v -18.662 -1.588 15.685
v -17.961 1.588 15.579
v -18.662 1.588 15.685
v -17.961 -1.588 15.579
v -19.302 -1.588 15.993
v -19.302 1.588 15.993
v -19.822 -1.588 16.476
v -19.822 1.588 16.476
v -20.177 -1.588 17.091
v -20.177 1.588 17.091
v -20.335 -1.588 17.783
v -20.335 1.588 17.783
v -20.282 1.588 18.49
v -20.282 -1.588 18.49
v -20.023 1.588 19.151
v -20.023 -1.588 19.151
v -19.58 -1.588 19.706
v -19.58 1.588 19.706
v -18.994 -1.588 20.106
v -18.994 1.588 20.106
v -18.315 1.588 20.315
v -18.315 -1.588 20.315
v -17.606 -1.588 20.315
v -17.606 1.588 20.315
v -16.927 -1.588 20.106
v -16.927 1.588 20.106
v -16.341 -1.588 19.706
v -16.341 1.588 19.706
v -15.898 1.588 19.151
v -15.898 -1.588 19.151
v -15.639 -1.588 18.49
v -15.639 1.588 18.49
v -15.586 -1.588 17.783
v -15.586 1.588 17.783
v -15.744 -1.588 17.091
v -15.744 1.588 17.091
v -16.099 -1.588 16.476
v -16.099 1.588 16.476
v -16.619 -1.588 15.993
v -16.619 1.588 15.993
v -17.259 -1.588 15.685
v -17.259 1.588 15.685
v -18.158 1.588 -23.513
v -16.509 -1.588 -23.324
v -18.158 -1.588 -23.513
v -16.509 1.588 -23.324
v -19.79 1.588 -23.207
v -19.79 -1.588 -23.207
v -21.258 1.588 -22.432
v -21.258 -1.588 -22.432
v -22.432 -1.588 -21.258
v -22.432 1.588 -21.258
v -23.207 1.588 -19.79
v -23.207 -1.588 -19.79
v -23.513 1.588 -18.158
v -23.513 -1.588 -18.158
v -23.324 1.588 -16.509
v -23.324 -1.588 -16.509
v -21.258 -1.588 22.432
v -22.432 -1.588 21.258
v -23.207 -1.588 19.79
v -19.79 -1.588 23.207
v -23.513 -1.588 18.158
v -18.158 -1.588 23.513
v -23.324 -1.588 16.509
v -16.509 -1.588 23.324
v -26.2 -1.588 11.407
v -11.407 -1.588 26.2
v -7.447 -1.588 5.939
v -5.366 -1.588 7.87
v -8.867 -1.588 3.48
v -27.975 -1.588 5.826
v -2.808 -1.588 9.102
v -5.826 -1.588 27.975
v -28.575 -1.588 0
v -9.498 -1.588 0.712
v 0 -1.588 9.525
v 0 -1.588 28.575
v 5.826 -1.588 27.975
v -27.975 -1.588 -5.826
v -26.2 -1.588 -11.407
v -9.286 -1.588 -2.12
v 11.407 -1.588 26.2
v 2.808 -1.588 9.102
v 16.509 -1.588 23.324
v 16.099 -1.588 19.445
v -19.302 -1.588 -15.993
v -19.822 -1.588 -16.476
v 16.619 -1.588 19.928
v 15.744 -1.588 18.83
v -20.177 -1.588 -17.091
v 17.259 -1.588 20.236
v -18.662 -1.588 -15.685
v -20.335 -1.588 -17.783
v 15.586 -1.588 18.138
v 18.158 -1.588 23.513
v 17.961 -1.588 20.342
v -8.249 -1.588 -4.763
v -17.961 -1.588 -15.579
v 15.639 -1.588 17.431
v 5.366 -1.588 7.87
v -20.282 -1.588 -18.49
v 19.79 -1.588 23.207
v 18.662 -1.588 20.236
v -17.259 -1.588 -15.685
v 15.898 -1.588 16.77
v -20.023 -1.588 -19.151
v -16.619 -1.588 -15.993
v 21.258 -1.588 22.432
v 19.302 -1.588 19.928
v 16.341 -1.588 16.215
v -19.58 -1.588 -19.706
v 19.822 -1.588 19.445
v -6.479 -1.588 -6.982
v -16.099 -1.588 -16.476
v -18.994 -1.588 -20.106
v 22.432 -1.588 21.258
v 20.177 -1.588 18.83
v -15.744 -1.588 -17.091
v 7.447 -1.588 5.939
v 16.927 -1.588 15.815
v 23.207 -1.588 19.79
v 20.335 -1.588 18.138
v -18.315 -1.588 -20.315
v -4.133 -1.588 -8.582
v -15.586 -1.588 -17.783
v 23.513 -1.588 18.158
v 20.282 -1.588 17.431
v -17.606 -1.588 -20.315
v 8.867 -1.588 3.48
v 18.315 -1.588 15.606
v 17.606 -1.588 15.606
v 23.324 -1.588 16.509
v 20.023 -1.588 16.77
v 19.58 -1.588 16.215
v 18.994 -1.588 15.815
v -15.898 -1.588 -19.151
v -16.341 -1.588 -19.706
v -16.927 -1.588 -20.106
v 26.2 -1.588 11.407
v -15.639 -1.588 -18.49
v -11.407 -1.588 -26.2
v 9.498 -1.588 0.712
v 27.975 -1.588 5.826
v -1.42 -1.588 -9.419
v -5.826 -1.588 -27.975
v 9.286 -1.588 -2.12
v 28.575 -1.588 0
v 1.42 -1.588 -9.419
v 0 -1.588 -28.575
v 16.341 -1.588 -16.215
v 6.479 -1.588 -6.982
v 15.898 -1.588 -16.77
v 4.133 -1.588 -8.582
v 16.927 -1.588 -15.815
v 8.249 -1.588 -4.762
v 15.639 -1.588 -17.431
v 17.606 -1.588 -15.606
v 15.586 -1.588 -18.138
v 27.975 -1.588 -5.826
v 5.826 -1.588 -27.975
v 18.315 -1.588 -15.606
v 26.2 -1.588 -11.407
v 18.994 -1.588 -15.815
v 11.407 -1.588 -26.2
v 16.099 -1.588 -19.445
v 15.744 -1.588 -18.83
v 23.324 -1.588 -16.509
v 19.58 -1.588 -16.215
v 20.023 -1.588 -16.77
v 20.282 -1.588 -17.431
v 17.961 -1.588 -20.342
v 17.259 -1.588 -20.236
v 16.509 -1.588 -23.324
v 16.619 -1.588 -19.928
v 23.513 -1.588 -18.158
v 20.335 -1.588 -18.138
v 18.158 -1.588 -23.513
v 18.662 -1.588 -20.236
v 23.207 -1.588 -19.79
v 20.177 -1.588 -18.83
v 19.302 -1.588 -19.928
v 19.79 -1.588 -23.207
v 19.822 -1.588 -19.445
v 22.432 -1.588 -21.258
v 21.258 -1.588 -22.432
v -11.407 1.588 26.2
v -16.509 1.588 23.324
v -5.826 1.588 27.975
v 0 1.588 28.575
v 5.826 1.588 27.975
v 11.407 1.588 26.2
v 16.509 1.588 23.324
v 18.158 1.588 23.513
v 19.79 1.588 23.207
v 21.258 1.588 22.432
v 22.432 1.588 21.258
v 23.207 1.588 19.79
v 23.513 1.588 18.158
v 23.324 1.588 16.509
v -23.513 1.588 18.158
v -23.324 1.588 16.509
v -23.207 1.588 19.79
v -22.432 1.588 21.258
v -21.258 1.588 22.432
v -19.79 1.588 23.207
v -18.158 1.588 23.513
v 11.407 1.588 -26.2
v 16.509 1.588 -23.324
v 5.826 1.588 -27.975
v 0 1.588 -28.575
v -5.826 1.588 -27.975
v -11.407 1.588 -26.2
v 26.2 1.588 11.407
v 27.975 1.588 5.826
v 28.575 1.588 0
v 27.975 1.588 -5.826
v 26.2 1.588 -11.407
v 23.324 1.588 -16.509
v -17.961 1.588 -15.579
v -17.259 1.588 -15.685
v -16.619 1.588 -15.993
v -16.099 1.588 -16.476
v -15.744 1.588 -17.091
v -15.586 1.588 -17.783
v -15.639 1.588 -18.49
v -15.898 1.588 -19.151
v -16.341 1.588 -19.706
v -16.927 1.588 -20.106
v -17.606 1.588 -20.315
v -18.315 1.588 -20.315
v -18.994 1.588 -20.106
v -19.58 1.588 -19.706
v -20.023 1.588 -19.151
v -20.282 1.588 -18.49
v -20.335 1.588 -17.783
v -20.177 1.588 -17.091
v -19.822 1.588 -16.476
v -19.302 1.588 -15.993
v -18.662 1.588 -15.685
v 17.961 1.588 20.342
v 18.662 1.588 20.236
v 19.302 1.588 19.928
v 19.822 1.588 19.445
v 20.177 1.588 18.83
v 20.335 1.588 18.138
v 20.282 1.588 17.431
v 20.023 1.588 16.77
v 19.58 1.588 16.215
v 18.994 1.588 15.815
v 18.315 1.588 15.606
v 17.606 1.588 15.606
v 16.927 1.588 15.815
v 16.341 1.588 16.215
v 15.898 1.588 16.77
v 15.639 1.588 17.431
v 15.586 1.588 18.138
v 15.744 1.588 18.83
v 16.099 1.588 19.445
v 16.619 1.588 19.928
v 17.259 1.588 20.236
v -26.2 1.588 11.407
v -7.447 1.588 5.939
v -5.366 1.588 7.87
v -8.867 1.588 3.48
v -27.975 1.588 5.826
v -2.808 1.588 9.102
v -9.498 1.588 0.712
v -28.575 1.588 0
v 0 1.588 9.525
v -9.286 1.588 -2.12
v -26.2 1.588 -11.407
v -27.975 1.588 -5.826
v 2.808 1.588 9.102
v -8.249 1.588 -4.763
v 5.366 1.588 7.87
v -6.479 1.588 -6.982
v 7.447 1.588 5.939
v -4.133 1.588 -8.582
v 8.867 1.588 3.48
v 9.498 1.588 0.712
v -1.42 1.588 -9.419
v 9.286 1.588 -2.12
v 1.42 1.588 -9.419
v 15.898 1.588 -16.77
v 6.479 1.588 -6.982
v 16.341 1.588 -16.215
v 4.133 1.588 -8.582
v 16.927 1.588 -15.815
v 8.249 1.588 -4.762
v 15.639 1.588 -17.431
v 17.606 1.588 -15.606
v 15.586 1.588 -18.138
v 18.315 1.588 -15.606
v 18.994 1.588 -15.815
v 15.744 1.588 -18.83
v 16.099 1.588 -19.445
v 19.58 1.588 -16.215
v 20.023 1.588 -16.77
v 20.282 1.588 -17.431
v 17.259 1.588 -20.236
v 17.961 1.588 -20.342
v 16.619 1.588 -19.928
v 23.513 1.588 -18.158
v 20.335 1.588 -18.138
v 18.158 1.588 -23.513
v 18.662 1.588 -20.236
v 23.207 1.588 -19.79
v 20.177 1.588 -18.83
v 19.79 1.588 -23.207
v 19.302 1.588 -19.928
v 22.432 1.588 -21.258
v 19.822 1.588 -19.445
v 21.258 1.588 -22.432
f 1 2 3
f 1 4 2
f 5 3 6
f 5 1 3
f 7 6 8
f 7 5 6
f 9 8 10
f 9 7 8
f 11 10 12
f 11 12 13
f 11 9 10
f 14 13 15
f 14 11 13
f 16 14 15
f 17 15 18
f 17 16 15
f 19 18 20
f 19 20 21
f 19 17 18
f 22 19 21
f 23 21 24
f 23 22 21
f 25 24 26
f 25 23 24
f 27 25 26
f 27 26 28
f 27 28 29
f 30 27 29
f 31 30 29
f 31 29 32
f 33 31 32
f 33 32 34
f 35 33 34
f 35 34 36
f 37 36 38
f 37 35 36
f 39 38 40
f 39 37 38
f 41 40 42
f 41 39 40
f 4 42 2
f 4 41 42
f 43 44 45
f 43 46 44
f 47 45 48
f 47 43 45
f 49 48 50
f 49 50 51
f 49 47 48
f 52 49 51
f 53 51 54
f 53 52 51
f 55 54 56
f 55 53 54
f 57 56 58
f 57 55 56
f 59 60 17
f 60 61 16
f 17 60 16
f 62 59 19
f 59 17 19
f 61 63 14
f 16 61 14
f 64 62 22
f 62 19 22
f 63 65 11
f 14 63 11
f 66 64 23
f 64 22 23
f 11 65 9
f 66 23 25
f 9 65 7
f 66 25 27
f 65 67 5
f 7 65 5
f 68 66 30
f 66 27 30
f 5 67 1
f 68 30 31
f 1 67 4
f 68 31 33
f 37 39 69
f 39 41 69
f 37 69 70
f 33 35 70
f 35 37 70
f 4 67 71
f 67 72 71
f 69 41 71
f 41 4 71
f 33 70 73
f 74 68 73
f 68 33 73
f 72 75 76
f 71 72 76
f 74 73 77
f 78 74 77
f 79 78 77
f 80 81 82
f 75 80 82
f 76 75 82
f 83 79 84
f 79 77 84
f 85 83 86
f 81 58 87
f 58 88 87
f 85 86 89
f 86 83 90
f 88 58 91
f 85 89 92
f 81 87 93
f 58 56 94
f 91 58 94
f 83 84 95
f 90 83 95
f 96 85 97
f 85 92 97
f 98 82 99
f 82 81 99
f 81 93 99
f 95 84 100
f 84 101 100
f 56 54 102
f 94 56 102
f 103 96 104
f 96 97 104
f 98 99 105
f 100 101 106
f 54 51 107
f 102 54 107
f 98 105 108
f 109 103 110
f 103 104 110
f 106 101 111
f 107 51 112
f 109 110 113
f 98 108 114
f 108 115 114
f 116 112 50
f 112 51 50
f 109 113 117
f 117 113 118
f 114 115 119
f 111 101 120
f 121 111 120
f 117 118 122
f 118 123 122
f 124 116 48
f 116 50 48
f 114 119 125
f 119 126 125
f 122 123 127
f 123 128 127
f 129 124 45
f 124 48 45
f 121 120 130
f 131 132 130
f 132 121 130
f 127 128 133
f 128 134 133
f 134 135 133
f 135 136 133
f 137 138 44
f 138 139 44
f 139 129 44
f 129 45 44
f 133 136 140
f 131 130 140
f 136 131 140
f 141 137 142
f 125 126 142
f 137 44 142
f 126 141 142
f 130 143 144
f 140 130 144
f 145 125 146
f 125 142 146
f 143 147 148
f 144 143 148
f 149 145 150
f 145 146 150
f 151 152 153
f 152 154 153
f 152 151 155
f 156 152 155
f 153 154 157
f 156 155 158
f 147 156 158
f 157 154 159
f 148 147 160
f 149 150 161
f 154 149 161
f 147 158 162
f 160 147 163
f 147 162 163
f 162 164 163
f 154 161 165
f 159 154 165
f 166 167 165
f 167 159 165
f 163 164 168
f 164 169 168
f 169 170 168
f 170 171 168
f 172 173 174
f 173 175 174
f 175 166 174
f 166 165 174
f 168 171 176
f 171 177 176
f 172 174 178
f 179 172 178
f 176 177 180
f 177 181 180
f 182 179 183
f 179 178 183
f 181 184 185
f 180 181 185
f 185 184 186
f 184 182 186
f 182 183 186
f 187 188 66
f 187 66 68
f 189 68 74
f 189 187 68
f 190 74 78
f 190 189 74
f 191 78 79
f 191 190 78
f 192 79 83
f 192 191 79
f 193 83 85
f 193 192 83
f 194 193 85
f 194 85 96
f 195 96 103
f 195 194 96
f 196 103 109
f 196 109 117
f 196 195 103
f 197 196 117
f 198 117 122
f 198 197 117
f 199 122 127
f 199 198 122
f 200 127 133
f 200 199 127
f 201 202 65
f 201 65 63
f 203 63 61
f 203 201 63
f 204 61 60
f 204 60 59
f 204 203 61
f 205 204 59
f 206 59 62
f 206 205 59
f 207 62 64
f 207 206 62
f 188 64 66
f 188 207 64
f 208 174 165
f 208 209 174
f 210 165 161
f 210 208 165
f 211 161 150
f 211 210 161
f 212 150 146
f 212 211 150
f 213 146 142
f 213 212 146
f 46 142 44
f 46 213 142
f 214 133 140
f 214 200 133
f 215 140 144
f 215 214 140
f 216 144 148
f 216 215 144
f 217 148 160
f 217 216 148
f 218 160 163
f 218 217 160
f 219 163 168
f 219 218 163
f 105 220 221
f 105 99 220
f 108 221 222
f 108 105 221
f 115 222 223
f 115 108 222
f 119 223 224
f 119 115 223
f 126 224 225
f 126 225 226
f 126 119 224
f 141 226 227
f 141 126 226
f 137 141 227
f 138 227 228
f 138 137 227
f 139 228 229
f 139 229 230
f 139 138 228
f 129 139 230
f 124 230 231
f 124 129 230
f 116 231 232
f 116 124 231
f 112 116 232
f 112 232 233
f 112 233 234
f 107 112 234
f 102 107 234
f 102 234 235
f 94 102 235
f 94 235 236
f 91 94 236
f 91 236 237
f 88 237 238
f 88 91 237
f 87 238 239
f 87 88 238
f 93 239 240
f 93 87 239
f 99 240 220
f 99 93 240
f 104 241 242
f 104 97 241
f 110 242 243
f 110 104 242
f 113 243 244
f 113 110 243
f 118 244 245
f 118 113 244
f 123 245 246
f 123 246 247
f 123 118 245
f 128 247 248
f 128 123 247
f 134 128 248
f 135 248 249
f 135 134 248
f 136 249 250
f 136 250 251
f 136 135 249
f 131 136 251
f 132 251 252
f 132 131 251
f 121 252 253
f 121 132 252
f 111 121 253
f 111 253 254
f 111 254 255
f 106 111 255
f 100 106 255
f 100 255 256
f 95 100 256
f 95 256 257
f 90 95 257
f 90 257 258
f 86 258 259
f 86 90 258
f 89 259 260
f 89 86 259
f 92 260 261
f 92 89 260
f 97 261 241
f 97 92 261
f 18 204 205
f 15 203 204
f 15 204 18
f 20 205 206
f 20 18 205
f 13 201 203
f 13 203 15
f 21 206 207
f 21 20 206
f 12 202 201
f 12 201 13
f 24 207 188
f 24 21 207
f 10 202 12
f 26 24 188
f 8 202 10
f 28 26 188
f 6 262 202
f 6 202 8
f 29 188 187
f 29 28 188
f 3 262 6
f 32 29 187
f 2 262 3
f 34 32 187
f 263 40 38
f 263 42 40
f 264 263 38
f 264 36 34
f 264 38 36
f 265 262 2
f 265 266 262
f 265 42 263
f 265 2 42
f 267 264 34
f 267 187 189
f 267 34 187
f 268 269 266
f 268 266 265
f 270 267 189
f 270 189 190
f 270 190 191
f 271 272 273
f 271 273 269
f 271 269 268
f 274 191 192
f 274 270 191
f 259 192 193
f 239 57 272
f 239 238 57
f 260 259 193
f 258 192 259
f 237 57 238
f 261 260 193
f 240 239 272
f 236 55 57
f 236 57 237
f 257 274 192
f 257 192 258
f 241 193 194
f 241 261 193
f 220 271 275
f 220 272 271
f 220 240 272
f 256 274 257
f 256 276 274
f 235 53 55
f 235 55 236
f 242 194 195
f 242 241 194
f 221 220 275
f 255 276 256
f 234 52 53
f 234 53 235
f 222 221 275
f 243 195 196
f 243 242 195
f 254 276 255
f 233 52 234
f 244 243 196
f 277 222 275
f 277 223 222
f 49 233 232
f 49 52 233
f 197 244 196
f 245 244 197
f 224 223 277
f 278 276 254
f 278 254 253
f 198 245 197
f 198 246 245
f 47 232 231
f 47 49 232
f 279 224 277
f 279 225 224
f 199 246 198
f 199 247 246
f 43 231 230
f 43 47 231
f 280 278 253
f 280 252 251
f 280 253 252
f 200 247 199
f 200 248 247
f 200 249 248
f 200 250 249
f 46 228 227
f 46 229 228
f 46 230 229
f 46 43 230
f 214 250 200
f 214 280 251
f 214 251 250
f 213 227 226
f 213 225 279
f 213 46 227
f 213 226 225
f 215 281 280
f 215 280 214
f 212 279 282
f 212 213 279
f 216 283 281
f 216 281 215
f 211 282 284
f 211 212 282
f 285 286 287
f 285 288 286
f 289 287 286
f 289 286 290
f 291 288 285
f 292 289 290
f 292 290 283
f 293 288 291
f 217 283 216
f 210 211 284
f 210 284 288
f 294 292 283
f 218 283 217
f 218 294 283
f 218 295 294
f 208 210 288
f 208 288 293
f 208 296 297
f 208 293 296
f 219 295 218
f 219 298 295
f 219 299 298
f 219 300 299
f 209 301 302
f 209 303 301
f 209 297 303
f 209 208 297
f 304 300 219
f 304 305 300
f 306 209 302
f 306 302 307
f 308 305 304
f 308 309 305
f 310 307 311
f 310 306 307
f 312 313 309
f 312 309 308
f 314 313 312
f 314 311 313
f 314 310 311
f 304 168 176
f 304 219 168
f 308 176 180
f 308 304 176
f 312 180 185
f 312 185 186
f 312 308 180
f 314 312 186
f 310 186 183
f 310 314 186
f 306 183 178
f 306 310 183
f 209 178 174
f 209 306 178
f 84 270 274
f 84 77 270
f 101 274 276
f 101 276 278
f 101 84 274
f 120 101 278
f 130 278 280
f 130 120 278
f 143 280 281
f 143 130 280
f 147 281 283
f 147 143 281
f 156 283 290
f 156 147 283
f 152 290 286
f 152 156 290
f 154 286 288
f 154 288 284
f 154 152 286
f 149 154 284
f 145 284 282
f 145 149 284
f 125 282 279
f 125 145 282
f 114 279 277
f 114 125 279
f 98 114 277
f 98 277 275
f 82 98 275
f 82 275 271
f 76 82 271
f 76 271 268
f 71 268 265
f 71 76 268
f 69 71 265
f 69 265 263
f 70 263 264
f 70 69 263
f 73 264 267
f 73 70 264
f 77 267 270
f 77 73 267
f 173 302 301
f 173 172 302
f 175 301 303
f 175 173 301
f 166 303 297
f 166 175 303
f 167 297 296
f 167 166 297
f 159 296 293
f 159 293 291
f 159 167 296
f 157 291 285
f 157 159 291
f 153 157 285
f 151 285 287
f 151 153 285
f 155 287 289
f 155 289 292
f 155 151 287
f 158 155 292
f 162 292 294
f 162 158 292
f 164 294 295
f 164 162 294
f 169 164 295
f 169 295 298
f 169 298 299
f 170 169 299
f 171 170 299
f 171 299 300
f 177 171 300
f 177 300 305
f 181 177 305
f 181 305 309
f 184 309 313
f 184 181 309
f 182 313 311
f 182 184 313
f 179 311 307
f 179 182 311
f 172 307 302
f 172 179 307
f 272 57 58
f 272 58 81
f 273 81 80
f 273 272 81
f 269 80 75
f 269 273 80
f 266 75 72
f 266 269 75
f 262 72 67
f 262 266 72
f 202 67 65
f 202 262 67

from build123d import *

# Parameters (mm, degrees)
SKETCH1_R           = 2.38125
SKETCH1_R_2         = 9.525
BOSS_EXTRUDE1_DEPTH = 1.5875


with BuildPart() as part:
    # Sketch1 → Boss-Extrude1 (new, symmetric)
    with BuildSketch(Plane(origin=(0, 0, 0), x_dir=(1, 0, 0), z_dir=(0, 1, 0))):
        with BuildLine():
            ThreePointArc((-16.508630953, 23.323716022), (-21.889374295, 21.889374295), (-23.323716022, 16.508630953))
            ThreePointArc((-23.323716022, 16.508630953), (-28.575, 0), (-23.323716022, -16.508630953))
            ThreePointArc((-23.323716022, -16.508630953), (-21.889374295, -21.889374295), (-16.508630953, -23.323716022))
            ThreePointArc((-16.508630953, -23.323716022), (0, -28.575), (16.508630953, -23.323716022))
            ThreePointArc((16.508630953, -23.323716022), (21.889374295, -21.889374295), (23.323716022, -16.508630953))
            ThreePointArc((23.323716022, -16.508630953), (28.575, 0), (23.323716022, 16.508630953))
            ThreePointArc((23.323716022, 16.508630953), (21.889374295, 21.889374295), (16.508630953, 23.323716022))
            ThreePointArc((16.508630953, 23.323716022), (0, 28.575), (-16.508630953, 23.323716022))
        make_face()
        with Locations(Location((-17.960512242, 17.960512242, 0), (0, 0, 270))):
            Circle(SKETCH1_R, mode=Mode.SUBTRACT)
        with Locations(Location((17.960512242, 17.960512242, 0), (0, 0, 90))):
            Circle(SKETCH1_R, mode=Mode.SUBTRACT)
        with Locations(Location((-17.960512242, -17.960512242, 0), (0, 0, 90))):
            Circle(SKETCH1_R, mode=Mode.SUBTRACT)
        with Locations(Location((17.960512242, -17.960512242, 0), (0, 0, 270))):
            Circle(SKETCH1_R, mode=Mode.SUBTRACT)
        with Locations(Location((0, 0, 0), (0, 0, 270))):
            Circle(SKETCH1_R_2, mode=Mode.SUBTRACT)
    extrude(amount=BOSS_EXTRUDE1_DEPTH, both=True)


solid = part.part
